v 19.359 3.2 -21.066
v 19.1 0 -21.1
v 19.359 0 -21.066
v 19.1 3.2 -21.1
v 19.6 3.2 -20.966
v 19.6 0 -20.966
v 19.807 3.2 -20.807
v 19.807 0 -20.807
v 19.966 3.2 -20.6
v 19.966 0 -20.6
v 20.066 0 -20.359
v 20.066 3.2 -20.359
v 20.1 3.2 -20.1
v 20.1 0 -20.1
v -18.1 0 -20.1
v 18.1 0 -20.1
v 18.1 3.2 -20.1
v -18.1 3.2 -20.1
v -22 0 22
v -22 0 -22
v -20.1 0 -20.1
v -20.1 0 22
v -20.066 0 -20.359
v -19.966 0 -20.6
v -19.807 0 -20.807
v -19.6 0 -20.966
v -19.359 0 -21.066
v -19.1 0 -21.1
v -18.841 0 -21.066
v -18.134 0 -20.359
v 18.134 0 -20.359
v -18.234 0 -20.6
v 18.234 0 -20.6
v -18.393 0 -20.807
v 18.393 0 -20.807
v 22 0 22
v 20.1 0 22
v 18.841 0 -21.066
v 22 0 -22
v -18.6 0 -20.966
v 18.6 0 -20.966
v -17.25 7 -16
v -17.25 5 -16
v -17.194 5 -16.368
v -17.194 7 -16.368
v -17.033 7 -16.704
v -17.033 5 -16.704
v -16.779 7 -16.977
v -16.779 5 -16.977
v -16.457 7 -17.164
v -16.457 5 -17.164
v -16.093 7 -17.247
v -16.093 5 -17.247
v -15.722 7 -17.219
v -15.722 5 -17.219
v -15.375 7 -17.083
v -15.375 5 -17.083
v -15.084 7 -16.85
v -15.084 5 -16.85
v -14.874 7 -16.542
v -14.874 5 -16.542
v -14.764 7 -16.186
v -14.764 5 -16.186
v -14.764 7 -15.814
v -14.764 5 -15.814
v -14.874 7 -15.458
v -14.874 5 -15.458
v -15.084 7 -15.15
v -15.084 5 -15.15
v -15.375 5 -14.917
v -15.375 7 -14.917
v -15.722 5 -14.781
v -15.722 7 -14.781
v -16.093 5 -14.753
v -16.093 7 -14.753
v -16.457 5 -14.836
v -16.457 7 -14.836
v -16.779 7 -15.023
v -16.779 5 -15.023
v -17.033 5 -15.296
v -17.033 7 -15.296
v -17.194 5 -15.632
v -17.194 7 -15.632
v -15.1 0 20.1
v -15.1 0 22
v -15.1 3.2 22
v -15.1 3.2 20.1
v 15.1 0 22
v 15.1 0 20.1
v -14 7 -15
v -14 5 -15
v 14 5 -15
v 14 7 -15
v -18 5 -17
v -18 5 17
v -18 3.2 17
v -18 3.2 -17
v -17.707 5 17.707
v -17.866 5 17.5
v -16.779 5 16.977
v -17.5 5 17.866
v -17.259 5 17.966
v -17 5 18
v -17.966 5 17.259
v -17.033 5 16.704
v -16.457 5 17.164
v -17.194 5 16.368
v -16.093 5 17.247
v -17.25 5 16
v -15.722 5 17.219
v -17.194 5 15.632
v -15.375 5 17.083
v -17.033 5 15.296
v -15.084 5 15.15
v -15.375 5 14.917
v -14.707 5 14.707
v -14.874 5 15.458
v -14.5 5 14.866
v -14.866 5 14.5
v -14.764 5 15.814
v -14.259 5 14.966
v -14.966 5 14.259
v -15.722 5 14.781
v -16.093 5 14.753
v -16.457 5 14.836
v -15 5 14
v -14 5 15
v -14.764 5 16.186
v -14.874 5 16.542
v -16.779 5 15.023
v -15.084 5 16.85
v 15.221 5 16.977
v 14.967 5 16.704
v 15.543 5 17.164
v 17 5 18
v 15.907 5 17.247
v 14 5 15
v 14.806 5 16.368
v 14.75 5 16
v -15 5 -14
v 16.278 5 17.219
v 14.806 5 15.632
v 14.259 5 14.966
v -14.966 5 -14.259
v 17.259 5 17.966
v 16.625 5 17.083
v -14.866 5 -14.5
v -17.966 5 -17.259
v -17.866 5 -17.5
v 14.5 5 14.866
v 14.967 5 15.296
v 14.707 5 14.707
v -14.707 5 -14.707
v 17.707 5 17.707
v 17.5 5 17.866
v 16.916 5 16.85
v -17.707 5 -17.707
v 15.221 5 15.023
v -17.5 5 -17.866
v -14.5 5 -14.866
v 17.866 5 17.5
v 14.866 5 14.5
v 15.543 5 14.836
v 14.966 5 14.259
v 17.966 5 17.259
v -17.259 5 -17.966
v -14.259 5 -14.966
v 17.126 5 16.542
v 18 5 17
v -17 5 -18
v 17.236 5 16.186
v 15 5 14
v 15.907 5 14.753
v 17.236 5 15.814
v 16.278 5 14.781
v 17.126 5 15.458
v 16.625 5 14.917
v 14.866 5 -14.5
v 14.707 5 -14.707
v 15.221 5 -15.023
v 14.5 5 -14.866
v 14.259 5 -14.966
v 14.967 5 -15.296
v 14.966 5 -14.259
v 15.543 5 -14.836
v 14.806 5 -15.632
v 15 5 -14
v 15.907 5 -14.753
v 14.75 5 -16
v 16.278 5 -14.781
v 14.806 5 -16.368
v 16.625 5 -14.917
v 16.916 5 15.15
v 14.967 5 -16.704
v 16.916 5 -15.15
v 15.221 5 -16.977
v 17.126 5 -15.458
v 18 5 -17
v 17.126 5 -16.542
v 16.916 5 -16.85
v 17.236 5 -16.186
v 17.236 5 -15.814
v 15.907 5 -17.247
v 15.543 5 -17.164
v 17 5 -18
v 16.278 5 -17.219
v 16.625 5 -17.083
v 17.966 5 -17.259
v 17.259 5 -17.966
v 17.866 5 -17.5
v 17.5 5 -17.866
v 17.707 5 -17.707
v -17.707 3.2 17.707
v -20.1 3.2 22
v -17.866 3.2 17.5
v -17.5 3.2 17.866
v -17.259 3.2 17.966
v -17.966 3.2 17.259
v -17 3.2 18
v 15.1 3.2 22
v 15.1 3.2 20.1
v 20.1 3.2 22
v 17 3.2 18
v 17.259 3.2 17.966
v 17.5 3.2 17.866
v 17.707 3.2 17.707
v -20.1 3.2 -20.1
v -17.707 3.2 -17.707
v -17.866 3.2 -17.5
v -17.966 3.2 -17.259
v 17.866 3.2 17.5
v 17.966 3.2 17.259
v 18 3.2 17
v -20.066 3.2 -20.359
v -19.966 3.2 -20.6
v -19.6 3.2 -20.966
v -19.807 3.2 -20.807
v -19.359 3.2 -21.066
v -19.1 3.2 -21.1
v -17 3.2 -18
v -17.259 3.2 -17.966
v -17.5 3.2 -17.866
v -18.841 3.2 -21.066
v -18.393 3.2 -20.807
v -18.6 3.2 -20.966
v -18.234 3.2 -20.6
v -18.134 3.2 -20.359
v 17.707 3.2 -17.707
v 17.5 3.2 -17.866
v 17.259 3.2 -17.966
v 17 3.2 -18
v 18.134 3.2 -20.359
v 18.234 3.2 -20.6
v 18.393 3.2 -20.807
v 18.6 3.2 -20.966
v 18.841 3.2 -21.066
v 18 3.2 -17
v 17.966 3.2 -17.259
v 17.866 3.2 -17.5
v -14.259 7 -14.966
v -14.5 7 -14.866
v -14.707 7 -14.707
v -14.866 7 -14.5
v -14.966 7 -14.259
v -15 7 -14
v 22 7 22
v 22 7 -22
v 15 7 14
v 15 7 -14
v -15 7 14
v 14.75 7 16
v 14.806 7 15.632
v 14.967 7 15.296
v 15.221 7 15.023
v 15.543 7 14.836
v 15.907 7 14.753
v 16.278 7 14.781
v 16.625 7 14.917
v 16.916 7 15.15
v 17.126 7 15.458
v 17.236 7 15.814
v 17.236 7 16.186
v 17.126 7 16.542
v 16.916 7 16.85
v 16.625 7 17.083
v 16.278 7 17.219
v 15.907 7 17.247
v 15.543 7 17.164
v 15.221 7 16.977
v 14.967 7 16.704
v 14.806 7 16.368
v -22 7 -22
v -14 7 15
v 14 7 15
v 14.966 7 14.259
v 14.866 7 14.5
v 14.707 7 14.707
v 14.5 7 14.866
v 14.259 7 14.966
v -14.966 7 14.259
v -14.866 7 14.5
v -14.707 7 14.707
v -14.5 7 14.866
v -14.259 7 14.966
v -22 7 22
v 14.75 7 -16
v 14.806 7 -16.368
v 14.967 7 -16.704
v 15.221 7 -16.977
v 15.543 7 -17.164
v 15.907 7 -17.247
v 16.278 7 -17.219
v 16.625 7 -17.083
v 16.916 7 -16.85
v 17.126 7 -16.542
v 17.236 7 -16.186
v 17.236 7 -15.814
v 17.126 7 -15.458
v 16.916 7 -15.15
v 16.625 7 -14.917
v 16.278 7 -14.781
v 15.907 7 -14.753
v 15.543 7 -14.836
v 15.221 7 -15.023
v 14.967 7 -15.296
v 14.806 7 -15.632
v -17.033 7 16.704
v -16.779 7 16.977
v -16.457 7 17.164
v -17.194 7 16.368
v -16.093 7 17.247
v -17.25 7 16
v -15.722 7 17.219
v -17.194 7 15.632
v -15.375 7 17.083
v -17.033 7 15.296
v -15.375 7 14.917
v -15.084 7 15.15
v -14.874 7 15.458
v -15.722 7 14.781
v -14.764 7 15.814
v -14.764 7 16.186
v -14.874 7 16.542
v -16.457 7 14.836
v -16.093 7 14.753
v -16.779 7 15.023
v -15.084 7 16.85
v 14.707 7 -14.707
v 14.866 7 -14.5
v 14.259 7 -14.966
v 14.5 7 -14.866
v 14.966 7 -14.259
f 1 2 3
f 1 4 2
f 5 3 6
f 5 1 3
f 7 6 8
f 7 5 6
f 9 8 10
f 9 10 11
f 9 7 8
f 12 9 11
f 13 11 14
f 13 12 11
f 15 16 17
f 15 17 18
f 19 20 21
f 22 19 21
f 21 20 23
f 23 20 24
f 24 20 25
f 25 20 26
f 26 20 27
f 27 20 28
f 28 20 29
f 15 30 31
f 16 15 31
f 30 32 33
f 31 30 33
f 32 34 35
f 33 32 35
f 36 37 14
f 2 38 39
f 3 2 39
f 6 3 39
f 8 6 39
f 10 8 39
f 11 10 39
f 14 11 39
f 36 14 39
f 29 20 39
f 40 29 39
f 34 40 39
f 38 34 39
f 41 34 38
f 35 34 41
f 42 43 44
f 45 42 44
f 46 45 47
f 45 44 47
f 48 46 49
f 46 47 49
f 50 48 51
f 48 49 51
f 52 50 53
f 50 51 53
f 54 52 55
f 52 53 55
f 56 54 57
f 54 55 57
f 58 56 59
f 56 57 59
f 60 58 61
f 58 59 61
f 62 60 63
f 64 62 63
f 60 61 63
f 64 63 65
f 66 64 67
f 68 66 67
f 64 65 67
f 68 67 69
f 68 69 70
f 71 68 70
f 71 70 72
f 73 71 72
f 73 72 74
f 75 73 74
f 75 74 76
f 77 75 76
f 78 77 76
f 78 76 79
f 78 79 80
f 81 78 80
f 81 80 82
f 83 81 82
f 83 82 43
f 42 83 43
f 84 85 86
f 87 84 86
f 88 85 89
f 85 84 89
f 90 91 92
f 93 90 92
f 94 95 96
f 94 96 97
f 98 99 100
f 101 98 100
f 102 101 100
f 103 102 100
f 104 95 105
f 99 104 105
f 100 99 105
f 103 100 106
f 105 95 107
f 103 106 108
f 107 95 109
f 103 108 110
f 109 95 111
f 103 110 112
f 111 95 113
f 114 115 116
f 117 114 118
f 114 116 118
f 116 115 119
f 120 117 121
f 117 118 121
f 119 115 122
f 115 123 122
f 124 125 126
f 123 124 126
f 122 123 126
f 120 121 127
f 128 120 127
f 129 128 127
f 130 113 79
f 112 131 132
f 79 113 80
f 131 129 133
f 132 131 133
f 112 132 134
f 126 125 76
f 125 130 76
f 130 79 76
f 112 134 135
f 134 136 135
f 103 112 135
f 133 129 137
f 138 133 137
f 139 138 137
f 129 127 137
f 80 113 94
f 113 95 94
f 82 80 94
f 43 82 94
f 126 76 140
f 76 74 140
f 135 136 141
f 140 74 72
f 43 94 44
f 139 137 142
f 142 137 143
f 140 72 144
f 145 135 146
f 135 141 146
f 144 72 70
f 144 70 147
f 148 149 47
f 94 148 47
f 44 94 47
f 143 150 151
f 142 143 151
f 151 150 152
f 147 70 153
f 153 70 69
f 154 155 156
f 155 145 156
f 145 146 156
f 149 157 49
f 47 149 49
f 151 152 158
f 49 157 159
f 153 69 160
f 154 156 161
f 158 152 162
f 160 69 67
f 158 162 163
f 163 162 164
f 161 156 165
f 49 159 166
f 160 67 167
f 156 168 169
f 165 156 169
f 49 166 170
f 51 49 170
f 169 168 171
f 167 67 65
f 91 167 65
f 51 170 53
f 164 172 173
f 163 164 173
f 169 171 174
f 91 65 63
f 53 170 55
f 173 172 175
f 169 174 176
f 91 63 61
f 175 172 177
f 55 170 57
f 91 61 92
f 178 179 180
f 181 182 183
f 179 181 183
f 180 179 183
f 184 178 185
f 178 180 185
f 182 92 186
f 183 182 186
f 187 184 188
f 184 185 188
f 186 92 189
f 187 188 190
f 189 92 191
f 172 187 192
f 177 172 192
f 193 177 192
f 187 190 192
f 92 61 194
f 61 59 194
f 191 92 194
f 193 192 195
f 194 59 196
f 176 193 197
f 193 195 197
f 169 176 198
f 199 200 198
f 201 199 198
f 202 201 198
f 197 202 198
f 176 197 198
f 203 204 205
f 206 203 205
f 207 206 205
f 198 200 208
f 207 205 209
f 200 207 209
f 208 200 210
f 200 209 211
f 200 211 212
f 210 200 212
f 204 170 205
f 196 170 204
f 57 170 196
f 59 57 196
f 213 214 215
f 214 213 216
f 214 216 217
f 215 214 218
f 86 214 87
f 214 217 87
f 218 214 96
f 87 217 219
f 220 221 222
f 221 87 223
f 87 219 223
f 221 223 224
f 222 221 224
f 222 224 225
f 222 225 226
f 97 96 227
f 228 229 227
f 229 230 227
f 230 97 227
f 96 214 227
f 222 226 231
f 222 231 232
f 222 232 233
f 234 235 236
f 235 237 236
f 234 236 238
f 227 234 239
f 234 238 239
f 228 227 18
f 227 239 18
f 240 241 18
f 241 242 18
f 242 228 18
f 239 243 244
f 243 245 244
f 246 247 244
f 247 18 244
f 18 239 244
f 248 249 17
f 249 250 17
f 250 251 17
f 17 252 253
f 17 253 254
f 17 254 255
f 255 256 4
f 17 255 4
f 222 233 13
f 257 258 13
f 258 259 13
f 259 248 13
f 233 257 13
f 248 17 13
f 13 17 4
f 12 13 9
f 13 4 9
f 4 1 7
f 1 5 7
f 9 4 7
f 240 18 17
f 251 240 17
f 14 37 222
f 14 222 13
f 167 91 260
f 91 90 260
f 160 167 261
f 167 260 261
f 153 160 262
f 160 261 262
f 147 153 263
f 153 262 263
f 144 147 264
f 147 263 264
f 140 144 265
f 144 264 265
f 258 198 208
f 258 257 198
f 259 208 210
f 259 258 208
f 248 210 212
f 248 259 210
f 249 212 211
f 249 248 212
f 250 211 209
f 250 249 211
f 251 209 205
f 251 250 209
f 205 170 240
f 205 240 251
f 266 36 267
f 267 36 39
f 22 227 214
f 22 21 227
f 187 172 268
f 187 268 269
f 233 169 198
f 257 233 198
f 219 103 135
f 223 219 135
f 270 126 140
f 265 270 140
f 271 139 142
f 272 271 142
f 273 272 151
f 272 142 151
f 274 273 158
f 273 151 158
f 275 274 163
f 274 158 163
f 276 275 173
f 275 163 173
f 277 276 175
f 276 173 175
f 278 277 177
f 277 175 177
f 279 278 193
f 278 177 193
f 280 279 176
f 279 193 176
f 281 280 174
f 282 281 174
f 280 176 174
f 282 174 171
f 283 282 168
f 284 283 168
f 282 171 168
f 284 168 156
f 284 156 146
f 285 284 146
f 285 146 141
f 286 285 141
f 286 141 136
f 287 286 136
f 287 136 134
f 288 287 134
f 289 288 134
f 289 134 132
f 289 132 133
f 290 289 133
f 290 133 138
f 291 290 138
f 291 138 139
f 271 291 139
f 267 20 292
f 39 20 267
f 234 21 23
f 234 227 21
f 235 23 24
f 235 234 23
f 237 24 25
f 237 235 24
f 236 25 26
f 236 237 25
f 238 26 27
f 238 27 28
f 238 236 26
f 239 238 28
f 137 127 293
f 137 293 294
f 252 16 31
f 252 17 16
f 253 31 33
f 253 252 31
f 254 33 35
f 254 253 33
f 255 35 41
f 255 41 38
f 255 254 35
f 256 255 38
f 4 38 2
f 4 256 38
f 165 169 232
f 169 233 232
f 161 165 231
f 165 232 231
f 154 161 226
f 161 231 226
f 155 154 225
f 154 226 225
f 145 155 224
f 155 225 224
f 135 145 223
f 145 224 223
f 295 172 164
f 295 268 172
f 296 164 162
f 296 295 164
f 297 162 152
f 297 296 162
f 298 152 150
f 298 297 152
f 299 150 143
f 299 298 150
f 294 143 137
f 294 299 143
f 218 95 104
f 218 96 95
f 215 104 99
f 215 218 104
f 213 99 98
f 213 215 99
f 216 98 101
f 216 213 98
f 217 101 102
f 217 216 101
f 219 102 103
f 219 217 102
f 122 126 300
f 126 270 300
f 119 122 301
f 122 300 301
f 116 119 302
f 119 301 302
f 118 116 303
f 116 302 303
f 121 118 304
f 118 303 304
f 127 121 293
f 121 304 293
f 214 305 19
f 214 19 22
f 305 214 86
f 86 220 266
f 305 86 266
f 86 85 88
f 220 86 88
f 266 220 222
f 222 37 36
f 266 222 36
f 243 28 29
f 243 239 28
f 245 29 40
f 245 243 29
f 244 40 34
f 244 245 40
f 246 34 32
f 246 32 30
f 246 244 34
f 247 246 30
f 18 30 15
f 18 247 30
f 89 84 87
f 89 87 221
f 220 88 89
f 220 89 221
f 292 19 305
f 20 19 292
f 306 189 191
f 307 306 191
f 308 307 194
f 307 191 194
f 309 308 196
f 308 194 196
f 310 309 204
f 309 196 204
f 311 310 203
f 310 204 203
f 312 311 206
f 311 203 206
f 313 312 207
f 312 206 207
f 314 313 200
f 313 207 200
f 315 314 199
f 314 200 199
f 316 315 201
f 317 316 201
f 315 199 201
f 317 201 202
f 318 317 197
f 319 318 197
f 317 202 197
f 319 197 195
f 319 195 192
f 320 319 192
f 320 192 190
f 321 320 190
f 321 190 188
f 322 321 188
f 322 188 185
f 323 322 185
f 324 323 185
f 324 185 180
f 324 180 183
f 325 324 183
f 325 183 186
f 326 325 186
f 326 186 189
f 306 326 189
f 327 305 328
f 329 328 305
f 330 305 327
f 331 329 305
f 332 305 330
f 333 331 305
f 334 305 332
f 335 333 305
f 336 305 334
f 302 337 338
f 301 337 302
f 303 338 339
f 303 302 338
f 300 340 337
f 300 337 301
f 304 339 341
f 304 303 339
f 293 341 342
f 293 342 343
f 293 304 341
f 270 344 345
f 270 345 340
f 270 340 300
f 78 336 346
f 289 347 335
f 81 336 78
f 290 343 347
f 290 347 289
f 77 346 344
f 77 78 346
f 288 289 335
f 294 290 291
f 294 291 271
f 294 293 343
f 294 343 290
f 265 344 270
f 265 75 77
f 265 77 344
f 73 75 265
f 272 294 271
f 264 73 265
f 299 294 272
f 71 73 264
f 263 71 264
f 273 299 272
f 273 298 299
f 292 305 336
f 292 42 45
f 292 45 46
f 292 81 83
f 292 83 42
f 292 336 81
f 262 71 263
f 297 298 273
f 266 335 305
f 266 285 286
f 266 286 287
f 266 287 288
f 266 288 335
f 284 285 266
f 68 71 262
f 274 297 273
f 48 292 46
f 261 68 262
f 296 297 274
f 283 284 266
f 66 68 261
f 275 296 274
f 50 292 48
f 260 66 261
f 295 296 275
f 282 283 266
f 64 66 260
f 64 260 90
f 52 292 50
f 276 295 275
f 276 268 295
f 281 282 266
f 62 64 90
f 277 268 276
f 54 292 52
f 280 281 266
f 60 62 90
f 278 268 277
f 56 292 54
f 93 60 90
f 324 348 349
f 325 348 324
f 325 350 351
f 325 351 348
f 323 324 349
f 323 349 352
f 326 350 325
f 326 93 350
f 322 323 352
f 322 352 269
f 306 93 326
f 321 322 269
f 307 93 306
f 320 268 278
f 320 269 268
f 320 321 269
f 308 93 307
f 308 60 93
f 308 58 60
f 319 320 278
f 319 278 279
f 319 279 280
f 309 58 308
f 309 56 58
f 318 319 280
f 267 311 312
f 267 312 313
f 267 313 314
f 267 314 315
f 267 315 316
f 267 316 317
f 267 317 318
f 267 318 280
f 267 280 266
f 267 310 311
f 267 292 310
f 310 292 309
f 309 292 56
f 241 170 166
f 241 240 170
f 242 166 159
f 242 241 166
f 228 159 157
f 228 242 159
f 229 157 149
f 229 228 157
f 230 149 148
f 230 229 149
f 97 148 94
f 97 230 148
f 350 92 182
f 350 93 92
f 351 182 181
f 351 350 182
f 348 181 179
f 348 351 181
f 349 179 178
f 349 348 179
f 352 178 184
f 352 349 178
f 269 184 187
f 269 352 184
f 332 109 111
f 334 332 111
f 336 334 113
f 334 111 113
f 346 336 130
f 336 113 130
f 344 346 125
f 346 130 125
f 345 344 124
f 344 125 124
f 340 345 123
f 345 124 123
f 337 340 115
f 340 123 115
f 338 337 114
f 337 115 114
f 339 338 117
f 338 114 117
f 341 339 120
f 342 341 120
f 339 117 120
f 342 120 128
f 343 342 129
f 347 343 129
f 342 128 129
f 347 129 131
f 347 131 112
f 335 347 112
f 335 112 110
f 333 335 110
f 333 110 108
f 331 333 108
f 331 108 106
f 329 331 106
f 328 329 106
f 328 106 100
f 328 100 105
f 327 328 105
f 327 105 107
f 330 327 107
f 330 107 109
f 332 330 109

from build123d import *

# Parameters (mm, degrees)
SKETCH1_W               = 44
SKETCH1_H               = 44
BOSS_EXTRUDE1_DEPTH     = 5
SKETCH2_W               = 36
SKETCH2_H               = 36
BOSS_EXTRUDE2_DEPTH     = 1.8
CUT_EXTRUDE1_REACH      = 51.447
SKETCH3_W               = 5
SKETCH3_H               = 3.2
SKETCH4_W               = 44
SKETCH4_H               = 44
SKETCH4_W_2             = 30
SKETCH4_H_2             = 30
BOSS_EXTRUDE3_DEPTH     = 2
FILLET1_R               = 1
TAP_DRILL_FOR_M3_TAP1_D = 2.5


with BuildPart() as part:
    # Sketch1 → Boss-Extrude1 (new body)
    with BuildSketch(Plane(origin=(0, 0, 0), x_dir=(1, 0, 0), z_dir=(0, 1, 0))):
        Rectangle(SKETCH1_W, SKETCH1_H)
        Polygon((20.1, -20.1), (20.1, 21.1), (18.1, 21.1), (18.1, 20.1), (-18.1, 20.1), (-18.1, 21.1), (-20.1, 21.1), (-20.1, -20.1), align=None, mode=Mode.SUBTRACT)
    extrude(amount=BOSS_EXTRUDE1_DEPTH)

    # Sketch2 → Boss-Extrude2 (add)
    with BuildSketch(Plane(origin=(0, 5, 0), x_dir=(1, 0, 0), z_dir=(0, 1, 0))):
        Polygon((-20.1, 21.1), (-20.1, -20.1), (20.1, -20.1), (20.1, 21.1), (18.1, 21.1), (18.1, 20.1), (-18.1, 20.1), (-18.1, 21.1), align=None)
        Rectangle(SKETCH2_W, SKETCH2_H, mode=Mode.SUBTRACT)
    extrude(amount=-BOSS_EXTRUDE2_DEPTH)

    # Sketch3 → Cut-Extrude1 (cut, up to next)
    with BuildSketch(Plane.XY.offset(22), mode=Mode.PRIVATE) as cut_extrude1_sk1:
        with Locations((-17.6, 1.6)):
            Rectangle(SKETCH3_W, SKETCH3_H)
    cut_extrude1_tool1 = extrude(cut_extrude1_sk1.sketch, amount=-CUT_EXTRUDE1_REACH, mode=Mode.PRIVATE) & part.part
    # Sketch3 → Cut-Extrude1 (cut, up to next)
    with BuildSketch(Plane.XY.offset(22), mode=Mode.PRIVATE) as cut_extrude1_sk2:
        with Locations((17.6, 1.6)):
            Rectangle(SKETCH3_W, SKETCH3_H)
    cut_extrude1_tool2 = extrude(cut_extrude1_sk2.sketch, amount=-CUT_EXTRUDE1_REACH, mode=Mode.PRIVATE) & part.part
    add(cut_extrude1_tool1.solids().sort_by_distance((-17.6, 1.6, 22))[0], mode=Mode.SUBTRACT)
    add(cut_extrude1_tool2.solids().sort_by_distance((17.6, 1.6, 22))[0], mode=Mode.SUBTRACT)

    # Sketch4 → Boss-Extrude3 (add)
    with BuildSketch(Plane(origin=(0, 5, 0), x_dir=(1, 0, 0), z_dir=(0, 1, 0))):
        Rectangle(SKETCH4_W, SKETCH4_H)
        Rectangle(SKETCH4_W_2, SKETCH4_H_2, mode=Mode.SUBTRACT)
    extrude(amount=BOSS_EXTRUDE3_DEPTH)

    # Fillet1
    fillet1_edges = [part.edges().sort_by_distance(p)[0] for p in [
        (-18, 4.1, 18),
        (18, 4.1, 18),
        (18, 4.1, -18),
        (-18, 4.1, -18),
        (-20.1, 1.6, -21.1),
        (-18.1, 1.6, -21.1),
        (18.1, 1.6, -21.1),
        (20.1, 1.6, -21.1),
        (-15, 6, -15),
        (-15, 6, 15),
        (15, 6, -15),
        (15, 6, 15),
    ]]
    fillet(fillet1_edges, radius=FILLET1_R - 0.0001)  # a hair under: the kernel refuses the full size

    # Tap Drill for M3 Tap1 (through all)
    with Locations(Plane(origin=(0, 7, 0), x_dir=(1, 0, 0), z_dir=(0, 1, 0))):
        with Locations((-16, 16), (16, 16), (16, -16), (-16, -16)):
            Hole(TAP_DRILL_FOR_M3_TAP1_D / 2)


solid = part.part
